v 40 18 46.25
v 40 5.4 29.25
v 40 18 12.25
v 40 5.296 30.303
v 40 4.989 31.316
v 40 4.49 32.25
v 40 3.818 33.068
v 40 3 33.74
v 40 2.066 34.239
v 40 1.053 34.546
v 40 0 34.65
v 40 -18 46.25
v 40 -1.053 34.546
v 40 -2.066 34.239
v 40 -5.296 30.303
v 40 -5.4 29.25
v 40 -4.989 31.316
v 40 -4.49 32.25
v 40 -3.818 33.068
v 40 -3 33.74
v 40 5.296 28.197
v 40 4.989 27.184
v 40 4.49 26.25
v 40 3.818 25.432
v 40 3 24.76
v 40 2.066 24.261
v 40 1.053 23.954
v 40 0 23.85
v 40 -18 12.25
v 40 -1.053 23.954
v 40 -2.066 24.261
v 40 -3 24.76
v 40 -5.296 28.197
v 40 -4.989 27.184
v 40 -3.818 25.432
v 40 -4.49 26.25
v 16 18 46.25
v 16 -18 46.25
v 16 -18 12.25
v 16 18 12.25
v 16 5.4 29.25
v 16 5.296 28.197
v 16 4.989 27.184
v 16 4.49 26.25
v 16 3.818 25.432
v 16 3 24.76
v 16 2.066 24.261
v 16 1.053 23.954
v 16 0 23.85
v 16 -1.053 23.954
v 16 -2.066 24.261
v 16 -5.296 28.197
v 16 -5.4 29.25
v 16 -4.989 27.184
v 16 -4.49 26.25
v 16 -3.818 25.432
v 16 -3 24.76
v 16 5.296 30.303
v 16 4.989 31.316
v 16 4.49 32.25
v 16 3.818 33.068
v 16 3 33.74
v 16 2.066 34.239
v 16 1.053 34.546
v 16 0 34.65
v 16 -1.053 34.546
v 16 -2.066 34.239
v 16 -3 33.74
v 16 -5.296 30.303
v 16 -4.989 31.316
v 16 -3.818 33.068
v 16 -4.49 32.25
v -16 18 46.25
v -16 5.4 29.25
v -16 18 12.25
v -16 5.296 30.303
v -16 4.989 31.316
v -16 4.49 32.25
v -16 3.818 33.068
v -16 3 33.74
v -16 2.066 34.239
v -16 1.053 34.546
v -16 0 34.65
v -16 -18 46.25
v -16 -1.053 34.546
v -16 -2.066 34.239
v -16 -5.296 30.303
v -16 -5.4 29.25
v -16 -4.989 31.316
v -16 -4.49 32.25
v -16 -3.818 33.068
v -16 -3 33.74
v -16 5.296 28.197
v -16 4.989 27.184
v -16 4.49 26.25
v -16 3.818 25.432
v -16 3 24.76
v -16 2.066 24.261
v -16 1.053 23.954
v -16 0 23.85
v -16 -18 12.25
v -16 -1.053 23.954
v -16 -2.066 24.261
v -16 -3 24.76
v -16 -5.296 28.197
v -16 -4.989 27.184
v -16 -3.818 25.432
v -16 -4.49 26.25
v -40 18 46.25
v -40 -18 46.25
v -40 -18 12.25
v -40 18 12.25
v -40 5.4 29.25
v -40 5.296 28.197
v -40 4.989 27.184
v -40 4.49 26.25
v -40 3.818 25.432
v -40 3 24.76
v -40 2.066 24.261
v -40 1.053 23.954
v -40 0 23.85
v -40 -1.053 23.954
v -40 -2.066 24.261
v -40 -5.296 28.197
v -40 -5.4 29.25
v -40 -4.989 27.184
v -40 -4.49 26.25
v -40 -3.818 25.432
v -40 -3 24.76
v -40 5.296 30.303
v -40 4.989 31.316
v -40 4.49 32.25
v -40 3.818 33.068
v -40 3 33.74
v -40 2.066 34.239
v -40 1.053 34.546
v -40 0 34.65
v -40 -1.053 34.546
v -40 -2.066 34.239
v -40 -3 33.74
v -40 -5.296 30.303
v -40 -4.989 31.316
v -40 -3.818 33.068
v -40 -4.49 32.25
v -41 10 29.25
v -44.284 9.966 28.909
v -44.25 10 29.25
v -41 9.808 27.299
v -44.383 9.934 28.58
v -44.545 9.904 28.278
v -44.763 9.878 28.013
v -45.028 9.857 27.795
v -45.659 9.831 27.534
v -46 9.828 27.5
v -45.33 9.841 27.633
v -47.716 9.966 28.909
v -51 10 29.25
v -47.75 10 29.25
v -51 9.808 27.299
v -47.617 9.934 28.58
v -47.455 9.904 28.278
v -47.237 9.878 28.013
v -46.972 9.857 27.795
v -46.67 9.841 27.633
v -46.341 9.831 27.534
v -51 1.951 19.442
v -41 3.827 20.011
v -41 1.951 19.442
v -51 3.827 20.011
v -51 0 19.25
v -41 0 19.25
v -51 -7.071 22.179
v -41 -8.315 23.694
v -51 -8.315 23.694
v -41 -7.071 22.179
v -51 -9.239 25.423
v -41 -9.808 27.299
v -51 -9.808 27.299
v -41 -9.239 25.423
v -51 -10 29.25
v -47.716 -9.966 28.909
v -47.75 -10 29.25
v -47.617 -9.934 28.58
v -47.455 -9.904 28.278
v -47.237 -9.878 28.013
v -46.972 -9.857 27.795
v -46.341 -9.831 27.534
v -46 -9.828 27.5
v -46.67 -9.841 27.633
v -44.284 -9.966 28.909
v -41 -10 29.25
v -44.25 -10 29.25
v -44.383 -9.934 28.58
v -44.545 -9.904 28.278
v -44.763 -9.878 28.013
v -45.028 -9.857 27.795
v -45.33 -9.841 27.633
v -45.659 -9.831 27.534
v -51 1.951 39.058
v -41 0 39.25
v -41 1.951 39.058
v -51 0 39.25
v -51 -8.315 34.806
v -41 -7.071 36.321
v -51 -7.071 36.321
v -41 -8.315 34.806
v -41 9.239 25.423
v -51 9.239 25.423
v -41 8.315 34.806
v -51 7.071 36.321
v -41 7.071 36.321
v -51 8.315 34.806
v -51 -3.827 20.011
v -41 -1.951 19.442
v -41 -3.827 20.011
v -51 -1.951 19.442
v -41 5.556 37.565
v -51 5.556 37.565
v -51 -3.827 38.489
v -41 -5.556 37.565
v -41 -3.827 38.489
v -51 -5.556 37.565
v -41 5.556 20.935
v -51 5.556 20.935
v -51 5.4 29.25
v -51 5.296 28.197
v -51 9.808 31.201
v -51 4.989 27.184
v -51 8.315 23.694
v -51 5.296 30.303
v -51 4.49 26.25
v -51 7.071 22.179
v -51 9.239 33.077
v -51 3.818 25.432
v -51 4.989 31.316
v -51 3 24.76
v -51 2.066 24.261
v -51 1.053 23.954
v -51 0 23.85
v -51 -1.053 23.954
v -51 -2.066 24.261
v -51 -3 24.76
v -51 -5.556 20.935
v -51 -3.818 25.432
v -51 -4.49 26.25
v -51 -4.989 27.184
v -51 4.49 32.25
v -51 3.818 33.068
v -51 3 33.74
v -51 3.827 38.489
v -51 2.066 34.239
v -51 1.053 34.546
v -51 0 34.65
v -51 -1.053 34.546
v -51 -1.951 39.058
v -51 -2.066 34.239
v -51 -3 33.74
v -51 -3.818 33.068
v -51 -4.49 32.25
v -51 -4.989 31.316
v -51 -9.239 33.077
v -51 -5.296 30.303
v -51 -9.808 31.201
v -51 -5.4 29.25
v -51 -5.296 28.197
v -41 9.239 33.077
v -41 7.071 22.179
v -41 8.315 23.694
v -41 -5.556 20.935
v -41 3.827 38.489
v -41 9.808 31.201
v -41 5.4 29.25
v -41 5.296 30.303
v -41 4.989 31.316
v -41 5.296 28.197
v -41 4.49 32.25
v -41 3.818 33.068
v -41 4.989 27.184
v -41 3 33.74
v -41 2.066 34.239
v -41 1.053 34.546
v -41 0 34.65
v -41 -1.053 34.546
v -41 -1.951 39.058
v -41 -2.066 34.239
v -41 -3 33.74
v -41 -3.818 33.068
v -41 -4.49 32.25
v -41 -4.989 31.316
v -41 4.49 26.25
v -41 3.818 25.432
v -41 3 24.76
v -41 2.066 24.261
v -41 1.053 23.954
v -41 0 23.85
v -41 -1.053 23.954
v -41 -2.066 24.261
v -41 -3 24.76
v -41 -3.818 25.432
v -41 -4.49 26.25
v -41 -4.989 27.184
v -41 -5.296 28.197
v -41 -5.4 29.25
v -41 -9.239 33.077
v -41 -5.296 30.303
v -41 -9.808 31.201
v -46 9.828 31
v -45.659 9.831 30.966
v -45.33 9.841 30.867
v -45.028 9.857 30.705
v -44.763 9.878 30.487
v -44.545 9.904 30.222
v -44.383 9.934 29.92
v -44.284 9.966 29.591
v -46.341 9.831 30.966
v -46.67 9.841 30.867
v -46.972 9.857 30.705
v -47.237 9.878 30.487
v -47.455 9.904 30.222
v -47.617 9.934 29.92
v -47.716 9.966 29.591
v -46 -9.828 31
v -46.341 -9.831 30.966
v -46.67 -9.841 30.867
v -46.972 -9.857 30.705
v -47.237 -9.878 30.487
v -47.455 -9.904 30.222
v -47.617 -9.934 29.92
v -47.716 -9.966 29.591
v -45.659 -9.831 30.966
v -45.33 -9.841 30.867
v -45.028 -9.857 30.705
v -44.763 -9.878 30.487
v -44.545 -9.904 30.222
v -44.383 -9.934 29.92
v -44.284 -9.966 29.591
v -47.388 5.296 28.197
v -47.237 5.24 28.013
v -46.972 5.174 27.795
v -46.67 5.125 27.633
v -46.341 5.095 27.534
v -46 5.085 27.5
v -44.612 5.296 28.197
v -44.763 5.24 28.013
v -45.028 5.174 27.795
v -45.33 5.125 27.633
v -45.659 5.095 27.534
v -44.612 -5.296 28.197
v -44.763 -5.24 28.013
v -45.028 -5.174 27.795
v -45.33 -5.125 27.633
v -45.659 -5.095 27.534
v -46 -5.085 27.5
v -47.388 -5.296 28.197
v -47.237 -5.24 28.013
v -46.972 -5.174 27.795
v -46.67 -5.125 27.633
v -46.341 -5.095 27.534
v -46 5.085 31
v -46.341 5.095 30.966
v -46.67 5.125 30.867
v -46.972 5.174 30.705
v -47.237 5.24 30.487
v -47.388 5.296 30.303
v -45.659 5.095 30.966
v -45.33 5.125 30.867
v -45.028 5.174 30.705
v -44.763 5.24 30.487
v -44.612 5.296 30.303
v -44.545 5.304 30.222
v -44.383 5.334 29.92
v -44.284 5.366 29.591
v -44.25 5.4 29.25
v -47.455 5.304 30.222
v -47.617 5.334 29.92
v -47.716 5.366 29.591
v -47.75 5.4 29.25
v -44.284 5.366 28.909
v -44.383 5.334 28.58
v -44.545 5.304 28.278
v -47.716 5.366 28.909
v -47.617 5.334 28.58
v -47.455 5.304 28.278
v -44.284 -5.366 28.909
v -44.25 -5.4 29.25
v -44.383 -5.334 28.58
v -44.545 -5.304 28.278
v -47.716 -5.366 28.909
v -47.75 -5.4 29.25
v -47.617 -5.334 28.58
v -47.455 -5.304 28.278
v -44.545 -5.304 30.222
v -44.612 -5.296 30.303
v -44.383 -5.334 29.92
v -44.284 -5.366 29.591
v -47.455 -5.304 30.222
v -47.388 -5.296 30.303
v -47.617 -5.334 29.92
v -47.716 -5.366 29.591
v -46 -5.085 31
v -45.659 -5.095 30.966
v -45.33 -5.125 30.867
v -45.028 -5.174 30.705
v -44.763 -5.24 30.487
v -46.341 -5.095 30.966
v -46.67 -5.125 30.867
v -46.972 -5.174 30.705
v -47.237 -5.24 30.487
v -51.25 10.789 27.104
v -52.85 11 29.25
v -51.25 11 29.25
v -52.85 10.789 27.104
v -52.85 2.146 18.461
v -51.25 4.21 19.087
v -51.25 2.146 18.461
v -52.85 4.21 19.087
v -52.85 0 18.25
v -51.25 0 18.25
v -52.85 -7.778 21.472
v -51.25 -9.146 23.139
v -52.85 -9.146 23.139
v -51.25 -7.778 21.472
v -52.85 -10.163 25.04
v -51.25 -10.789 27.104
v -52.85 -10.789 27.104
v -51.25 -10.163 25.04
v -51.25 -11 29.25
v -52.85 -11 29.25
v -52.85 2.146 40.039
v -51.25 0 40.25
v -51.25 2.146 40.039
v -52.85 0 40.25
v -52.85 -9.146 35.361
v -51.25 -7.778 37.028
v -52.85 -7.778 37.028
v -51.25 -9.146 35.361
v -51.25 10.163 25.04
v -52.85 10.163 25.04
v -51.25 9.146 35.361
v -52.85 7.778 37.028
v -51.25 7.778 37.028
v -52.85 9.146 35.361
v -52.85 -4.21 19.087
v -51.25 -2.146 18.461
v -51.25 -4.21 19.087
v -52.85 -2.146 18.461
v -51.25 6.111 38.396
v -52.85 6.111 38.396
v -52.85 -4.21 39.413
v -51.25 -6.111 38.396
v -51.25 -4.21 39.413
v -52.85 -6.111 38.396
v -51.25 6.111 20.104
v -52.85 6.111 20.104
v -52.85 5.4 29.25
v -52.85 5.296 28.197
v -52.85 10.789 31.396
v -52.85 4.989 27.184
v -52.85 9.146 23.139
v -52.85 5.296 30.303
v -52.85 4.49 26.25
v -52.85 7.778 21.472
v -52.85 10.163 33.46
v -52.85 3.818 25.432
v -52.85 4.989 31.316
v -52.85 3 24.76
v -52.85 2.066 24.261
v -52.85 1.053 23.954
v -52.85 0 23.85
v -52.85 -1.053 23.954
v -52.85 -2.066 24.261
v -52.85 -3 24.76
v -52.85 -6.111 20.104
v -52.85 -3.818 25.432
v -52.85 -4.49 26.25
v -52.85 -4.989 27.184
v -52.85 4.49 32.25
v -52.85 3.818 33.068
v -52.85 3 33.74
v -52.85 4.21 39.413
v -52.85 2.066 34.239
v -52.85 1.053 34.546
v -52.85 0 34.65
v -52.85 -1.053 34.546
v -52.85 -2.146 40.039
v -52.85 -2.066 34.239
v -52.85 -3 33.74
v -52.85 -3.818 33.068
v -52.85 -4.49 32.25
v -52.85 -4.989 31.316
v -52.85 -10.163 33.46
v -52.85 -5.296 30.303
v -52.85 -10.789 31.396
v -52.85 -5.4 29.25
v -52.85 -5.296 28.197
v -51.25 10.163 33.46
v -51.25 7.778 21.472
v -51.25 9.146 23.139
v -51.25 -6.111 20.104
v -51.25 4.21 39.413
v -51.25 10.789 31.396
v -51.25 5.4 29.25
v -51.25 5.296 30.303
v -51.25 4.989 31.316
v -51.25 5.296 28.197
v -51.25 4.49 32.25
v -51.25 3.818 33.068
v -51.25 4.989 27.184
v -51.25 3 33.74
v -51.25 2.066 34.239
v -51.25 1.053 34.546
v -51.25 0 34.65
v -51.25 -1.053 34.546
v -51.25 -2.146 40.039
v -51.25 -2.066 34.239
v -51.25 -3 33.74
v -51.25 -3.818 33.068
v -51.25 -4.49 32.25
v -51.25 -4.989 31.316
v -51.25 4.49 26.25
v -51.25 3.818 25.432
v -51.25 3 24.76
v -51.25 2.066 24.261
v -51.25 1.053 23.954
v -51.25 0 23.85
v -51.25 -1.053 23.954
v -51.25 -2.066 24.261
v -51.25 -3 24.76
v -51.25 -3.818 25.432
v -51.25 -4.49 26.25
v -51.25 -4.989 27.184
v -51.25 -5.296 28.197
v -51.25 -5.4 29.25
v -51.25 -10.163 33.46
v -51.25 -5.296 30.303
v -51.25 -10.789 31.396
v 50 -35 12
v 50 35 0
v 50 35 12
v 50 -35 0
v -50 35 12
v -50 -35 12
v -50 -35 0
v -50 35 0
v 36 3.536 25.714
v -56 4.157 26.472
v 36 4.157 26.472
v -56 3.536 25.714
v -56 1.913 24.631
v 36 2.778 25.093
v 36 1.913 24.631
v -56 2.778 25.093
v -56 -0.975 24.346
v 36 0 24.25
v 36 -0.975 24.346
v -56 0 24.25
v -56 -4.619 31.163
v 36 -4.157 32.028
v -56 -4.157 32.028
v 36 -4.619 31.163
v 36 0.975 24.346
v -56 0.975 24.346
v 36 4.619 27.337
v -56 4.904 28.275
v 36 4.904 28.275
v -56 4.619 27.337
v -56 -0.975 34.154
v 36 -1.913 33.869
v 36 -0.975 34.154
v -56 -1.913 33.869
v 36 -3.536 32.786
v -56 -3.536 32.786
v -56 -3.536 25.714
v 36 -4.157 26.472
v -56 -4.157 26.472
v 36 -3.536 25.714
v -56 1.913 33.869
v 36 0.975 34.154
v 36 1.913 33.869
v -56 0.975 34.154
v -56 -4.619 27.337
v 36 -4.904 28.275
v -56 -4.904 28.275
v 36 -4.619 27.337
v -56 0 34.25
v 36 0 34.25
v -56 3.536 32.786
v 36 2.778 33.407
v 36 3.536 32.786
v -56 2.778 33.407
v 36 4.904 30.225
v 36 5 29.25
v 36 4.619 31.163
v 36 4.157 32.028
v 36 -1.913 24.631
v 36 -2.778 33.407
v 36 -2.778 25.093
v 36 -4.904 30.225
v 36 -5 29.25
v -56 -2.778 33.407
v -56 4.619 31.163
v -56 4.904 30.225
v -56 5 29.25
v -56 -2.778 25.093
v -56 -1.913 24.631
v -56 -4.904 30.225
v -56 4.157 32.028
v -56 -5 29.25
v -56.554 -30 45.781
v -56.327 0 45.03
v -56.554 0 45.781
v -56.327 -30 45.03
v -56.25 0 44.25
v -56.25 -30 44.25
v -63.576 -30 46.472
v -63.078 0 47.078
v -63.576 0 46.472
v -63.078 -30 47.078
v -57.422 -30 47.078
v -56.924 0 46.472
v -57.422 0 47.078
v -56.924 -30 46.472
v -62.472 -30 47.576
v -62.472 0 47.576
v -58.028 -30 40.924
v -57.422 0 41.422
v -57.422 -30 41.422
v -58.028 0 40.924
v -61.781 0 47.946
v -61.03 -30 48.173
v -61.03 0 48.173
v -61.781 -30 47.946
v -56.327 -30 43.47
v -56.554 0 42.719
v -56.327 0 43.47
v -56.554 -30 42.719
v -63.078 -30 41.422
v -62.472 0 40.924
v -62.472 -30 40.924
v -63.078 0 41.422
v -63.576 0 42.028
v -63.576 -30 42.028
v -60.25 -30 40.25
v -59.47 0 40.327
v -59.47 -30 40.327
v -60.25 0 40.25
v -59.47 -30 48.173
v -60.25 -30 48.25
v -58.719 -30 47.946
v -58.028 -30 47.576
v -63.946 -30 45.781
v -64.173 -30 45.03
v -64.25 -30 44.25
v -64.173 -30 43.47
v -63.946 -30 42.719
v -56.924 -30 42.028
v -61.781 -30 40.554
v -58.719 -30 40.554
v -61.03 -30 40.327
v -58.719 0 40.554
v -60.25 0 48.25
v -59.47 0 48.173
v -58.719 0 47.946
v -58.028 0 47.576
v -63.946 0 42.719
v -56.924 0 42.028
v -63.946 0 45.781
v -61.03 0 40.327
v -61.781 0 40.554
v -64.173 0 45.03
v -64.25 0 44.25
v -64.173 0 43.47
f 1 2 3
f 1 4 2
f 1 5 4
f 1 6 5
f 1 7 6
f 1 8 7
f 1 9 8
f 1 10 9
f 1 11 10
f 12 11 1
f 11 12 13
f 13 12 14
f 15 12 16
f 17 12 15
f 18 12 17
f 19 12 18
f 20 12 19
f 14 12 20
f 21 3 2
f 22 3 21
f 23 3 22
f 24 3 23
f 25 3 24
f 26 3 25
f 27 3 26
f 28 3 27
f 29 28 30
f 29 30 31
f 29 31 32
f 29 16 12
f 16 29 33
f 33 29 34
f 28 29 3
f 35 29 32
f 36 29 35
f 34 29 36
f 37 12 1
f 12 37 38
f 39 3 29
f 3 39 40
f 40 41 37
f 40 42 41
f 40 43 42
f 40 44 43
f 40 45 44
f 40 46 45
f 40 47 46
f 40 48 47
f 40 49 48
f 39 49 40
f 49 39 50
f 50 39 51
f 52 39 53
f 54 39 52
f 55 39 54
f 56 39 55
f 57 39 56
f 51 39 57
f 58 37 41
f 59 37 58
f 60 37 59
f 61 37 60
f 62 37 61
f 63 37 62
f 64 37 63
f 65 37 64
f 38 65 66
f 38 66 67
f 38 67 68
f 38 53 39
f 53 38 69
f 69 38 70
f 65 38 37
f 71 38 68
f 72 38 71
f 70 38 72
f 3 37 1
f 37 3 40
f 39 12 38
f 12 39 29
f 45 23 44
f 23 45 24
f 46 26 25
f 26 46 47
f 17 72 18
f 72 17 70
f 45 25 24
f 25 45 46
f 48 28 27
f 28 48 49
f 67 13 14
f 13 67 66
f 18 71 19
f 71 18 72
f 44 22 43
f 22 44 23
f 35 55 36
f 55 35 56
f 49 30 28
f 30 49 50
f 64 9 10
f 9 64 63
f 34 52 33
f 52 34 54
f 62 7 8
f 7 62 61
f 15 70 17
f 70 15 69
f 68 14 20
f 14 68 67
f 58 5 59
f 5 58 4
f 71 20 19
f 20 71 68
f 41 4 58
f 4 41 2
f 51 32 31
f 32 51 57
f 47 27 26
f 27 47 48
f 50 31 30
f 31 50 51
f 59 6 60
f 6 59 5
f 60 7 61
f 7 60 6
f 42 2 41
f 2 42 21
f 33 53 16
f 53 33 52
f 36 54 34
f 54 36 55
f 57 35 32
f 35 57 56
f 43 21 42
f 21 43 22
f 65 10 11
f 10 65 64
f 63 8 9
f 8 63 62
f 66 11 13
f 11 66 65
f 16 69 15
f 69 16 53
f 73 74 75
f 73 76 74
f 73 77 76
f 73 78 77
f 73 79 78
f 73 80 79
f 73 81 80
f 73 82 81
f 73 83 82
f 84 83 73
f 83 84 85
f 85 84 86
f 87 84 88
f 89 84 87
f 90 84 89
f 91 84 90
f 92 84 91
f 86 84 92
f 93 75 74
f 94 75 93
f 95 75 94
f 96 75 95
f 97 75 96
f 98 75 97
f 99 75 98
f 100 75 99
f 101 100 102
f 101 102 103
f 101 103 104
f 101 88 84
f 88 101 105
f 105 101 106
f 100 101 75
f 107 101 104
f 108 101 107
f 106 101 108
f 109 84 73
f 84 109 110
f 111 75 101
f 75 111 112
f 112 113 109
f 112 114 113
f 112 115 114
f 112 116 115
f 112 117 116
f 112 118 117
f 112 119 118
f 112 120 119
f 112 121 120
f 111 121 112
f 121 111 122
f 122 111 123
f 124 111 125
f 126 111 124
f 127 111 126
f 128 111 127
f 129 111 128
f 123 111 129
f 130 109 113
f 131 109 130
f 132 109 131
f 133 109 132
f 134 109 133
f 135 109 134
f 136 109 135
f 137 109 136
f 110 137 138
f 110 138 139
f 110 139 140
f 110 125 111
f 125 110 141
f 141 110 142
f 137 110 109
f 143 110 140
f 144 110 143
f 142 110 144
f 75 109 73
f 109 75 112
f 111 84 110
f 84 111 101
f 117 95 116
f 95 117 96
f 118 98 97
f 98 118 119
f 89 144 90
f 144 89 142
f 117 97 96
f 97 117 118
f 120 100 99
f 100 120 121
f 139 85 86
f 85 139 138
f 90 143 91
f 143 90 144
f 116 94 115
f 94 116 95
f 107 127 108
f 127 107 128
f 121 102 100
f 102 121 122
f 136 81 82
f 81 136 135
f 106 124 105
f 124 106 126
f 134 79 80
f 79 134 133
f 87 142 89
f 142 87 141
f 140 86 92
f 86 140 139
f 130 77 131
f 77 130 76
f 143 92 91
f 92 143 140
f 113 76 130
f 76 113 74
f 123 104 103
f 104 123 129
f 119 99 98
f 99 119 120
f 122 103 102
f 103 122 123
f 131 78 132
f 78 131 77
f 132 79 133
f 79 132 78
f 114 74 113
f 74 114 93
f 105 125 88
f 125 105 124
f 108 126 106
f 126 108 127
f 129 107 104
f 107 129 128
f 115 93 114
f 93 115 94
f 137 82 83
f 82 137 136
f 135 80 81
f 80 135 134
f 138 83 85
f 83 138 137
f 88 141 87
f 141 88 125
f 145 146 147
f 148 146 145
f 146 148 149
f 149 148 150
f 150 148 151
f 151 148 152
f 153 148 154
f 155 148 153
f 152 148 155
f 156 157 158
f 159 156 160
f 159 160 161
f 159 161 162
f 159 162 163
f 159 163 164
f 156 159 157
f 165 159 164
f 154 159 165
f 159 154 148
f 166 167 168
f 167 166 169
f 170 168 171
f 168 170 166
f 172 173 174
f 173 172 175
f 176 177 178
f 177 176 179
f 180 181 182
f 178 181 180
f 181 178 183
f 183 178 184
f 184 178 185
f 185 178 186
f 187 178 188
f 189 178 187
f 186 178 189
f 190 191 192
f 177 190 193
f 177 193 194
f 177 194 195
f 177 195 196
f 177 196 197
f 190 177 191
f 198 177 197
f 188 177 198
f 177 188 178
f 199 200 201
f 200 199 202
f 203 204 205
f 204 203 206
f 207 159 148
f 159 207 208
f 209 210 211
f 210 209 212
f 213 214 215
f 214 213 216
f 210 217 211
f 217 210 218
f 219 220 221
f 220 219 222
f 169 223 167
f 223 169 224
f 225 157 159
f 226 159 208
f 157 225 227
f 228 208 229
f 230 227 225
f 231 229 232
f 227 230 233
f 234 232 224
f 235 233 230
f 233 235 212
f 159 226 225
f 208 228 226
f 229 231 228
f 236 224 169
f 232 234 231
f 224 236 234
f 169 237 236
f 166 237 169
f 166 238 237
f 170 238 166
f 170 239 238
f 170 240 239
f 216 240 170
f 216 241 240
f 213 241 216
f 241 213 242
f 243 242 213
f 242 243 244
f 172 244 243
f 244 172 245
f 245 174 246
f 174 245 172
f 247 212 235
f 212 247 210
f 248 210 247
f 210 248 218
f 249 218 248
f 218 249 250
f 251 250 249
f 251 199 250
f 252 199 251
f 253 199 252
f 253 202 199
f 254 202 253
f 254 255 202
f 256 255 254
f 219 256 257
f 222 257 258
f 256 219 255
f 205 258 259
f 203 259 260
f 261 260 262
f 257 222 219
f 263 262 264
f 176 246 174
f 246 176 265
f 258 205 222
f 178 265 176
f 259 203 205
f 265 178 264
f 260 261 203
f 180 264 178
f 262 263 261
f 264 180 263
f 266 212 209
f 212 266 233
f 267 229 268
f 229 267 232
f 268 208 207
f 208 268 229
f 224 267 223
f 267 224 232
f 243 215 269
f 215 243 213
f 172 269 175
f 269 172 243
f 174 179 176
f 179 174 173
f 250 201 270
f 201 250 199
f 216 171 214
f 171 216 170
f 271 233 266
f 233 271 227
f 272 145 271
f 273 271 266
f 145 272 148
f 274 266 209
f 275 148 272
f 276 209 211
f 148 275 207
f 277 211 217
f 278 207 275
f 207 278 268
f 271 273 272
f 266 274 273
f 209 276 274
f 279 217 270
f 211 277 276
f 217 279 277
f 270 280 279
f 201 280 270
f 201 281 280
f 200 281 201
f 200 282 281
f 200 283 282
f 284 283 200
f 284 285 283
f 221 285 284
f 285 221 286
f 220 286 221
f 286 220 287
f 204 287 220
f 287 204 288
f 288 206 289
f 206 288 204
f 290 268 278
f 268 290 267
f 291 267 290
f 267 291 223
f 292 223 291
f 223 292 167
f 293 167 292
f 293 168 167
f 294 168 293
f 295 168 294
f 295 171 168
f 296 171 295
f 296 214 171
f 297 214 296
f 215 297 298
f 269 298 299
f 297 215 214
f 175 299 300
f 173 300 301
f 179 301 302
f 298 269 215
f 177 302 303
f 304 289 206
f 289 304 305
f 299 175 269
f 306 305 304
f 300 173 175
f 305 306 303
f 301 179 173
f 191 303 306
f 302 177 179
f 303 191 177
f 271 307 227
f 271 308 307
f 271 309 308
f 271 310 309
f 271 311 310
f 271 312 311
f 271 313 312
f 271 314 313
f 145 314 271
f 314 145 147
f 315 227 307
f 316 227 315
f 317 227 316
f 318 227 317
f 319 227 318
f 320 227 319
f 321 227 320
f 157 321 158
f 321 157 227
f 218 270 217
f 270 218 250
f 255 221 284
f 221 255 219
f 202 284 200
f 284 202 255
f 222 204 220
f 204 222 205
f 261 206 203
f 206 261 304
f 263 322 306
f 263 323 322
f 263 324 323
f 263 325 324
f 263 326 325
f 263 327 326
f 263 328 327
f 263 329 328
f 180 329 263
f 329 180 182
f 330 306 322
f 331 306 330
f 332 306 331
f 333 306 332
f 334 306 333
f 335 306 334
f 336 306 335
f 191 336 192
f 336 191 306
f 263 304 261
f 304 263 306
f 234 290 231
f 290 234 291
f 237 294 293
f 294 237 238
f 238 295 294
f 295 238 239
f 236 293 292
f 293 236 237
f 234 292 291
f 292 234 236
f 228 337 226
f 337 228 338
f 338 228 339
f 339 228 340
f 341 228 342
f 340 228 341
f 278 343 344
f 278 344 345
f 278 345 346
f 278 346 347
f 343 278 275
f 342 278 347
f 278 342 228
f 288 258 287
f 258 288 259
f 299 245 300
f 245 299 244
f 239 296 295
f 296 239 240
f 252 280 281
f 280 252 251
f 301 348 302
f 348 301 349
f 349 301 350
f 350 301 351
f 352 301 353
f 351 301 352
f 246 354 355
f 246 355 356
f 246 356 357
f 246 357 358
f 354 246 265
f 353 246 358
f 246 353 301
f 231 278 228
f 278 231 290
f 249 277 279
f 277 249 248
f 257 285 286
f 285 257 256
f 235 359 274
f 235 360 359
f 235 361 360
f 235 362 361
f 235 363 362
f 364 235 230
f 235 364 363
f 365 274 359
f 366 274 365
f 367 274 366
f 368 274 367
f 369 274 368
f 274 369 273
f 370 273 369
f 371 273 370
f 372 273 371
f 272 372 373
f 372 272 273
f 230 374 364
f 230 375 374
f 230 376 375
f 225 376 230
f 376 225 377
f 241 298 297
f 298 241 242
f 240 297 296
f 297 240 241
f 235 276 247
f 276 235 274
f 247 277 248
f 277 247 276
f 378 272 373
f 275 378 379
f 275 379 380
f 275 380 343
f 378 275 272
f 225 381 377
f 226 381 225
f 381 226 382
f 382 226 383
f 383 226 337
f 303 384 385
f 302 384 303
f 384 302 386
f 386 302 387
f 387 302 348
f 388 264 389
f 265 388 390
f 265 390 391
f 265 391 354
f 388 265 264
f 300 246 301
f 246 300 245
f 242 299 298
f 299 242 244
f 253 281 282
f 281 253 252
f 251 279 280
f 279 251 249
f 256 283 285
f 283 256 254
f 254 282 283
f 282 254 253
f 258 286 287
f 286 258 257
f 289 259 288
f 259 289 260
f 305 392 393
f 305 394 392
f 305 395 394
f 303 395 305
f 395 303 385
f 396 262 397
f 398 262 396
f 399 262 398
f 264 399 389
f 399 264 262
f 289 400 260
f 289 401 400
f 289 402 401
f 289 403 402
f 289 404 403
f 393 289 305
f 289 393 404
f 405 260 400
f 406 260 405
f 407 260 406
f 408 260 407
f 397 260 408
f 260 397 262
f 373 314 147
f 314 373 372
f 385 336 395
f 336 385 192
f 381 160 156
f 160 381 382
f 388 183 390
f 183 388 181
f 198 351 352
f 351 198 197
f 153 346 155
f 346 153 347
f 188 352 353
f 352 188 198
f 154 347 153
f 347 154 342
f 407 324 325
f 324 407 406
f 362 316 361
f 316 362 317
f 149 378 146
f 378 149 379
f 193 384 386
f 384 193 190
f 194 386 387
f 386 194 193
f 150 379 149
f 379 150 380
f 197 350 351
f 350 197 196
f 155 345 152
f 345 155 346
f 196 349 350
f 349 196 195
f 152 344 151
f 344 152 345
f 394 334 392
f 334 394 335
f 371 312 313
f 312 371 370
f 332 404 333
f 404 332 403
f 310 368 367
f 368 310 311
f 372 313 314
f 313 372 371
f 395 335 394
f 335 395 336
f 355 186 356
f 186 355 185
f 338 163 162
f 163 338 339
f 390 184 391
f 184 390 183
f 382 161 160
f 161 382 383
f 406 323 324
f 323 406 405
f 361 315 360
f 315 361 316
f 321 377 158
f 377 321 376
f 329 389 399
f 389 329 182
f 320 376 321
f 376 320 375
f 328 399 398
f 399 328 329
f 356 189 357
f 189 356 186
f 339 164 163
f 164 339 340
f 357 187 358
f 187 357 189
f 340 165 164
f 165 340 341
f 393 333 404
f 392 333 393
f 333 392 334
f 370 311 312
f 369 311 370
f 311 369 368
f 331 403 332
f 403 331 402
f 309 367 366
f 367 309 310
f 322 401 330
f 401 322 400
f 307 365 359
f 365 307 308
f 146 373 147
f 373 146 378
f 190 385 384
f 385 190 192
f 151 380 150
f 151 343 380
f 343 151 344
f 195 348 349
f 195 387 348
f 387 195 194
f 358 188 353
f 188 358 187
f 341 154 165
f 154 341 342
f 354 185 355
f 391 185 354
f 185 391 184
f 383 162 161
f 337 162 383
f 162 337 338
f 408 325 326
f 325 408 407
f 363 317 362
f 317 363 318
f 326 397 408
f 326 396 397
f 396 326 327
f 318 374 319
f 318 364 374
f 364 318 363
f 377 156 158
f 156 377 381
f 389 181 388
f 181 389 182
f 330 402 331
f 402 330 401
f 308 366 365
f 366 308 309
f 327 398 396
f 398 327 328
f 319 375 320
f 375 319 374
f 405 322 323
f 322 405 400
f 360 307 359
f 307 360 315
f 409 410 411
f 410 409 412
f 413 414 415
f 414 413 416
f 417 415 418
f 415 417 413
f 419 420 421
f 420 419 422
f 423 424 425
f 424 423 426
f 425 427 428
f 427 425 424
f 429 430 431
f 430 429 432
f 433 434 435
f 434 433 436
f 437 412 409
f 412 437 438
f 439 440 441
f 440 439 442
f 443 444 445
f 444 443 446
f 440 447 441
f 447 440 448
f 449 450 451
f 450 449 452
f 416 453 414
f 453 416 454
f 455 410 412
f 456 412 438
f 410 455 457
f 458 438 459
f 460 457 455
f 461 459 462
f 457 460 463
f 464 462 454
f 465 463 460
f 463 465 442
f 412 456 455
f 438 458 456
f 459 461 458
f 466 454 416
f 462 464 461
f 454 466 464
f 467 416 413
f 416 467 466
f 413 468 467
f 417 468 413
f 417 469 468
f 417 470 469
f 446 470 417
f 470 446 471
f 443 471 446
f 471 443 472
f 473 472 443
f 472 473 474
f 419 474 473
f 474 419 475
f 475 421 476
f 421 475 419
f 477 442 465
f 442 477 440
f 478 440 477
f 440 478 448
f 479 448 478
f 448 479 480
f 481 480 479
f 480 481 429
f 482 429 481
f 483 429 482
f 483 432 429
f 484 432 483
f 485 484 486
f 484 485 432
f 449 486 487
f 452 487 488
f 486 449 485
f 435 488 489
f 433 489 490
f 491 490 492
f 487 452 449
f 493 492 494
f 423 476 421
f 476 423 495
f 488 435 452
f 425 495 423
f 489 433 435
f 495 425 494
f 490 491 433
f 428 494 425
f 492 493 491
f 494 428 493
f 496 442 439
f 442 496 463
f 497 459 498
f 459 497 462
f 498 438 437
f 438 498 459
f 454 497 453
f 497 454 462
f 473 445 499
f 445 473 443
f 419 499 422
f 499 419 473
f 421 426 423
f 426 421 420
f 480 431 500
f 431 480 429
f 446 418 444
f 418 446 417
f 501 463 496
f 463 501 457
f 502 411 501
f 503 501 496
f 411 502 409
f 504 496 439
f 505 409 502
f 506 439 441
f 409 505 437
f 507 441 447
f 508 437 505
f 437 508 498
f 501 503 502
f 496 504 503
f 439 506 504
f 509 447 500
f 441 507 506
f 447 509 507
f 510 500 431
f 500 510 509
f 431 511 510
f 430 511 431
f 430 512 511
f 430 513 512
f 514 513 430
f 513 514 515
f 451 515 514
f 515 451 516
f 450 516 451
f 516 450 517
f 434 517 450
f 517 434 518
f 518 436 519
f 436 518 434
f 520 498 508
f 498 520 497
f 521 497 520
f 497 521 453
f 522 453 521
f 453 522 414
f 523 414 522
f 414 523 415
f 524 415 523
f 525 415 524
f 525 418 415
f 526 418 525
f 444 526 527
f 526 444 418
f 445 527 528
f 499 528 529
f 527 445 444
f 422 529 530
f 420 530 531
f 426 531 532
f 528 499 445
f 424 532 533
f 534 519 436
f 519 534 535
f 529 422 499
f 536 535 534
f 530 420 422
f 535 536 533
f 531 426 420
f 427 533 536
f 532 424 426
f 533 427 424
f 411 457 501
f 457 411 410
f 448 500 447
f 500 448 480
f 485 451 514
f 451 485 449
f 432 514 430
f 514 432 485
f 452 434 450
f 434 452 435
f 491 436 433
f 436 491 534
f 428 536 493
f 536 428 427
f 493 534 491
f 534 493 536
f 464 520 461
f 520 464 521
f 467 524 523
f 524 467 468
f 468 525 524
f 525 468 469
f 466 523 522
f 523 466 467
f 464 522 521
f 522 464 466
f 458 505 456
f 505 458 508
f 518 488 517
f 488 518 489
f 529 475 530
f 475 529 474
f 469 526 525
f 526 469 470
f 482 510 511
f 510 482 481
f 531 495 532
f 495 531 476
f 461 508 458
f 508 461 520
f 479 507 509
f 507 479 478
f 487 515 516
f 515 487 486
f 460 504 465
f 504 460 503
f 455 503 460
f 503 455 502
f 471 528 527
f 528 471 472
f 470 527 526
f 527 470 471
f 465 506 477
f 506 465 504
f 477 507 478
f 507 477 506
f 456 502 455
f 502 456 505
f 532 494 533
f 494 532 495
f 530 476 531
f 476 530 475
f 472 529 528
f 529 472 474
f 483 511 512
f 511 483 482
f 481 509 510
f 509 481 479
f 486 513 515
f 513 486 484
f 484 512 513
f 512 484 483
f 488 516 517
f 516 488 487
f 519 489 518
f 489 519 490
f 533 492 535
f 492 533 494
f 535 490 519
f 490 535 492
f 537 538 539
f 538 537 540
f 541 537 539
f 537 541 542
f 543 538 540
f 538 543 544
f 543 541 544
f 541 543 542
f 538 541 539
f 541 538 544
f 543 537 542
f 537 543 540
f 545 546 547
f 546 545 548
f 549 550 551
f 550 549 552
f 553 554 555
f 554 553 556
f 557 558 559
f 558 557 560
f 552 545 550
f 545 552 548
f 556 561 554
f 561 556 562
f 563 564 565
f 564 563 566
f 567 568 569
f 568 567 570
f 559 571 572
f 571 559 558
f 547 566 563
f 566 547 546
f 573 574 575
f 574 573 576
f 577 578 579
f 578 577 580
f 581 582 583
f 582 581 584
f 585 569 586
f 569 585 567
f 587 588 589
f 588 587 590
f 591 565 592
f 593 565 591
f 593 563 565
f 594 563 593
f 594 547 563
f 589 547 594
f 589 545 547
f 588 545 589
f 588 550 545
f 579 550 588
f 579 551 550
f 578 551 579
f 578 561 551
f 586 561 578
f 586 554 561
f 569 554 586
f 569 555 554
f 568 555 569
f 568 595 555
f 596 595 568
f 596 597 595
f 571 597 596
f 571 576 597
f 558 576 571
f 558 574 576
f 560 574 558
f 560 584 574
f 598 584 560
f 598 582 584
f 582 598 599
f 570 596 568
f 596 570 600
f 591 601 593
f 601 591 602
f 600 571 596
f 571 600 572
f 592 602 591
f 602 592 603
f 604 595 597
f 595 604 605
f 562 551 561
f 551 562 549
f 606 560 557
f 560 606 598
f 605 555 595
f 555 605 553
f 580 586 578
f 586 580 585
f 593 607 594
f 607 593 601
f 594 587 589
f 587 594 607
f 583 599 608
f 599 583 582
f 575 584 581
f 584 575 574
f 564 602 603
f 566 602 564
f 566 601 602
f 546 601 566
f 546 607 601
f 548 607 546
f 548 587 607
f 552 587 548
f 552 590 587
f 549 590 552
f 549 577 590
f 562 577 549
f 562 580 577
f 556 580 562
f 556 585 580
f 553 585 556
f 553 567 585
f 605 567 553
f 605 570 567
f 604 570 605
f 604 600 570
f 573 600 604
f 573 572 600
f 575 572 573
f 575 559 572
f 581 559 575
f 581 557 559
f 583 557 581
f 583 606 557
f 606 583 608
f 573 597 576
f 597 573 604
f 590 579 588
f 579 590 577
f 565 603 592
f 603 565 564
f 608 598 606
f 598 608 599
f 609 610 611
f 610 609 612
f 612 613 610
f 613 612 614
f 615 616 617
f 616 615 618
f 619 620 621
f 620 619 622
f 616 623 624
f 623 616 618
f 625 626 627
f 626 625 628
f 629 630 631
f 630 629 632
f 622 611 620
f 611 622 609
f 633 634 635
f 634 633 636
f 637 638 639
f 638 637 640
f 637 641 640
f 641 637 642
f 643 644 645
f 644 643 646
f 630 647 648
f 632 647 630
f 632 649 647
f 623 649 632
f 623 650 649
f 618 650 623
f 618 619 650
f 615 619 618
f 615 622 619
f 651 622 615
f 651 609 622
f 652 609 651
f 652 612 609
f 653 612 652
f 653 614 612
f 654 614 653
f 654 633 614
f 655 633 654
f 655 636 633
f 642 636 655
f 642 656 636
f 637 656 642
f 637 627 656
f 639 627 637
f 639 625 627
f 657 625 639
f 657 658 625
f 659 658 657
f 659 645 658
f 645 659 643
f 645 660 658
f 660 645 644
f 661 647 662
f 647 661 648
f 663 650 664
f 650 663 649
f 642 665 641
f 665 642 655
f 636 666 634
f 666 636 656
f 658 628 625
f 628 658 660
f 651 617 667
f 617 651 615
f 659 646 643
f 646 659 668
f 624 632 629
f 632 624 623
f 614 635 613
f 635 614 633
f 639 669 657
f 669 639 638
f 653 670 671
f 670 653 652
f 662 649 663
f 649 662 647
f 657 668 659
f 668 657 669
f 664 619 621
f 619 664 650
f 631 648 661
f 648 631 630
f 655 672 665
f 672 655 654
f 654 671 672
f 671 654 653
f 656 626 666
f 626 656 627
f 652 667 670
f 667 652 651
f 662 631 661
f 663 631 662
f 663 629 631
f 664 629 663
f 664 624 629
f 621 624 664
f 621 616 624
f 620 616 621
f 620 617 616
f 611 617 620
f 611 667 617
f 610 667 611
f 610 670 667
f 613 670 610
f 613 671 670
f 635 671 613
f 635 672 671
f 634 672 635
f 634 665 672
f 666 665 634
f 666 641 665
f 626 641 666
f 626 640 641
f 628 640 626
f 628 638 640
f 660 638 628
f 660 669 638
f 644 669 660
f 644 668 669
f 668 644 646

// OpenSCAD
$fn = 32;

// ------------------------------------------------------------------------
// Machine vise: screw d10, jaws 24 x 34 mm
// Every part is its own module, assembly() places every instance.
// ------------------------------------------------------------------------

// --- part 1 ---
module vise_bed() {
  difference() {
    translate([-50, -35, 0]) cube([100, 70, 12]);
  }
}

// --- part 2 ---
module vise_jaw() {
  difference() {
    translate([-12, -18, 0]) cube([24, 36, 34]);
    translate([0, 0, 17]) rotate([0, 90, 0]) cylinder(h = 26, d = 10.8, center = true);
  }
}

// --- part 3 ---
module vise_screw() {
  translate([0, 0, -46]) cylinder(h = 92, d = 10);
}

// --- part 4 ---
module screw_collar() {
  difference() {
    cylinder(h = 10, d = 20);
    translate([0, 0, -1]) cylinder(h = 12, d = 10.8);
    translate([0, 0, 5]) rotate([90, 0, 0]) cylinder(h = 22, d = 3.5, center = true);
  }
}

// --- part 5 ---
module screw_washer() {
  difference() {
      translate([0, 0, 0]) cylinder(h = 1.6, d = 22);
      translate([0, 0, -1]) cylinder(h = 3.6, d = 10.8);
    }
}

// --- part 6 ---
module vise_handle() {
  cylinder(h = 30, d = 8);
}

// --- assembly ---
module assembly() {
  color([0.80, 0.24, 0.20]) translate([0, 0, 0]) rotate([0, 0, 0]) vise_bed();
  color([0.20, 0.45, 0.75]) translate([28, 0, 12.25]) rotate([0, 0, 0]) vise_jaw();
  color([0.25, 0.62, 0.32]) translate([-28, 0, 12.25]) rotate([0, 0, 0]) vise_jaw();
  color([0.92, 0.70, 0.18]) translate([-10, 0, 29.25]) rotate([0, 90, 0]) vise_screw();
  color([0.58, 0.35, 0.70]) translate([-51, 0, 29.25]) rotate([0, 90, 0]) screw_collar();
  color([0.16, 0.66, 0.66]) translate([-52.85, 0, 29.25]) rotate([0, 90, 0]) screw_washer();
  color([0.85, 0.48, 0.18]) translate([-60.25, 0, 44.25]) rotate([90, 0, 0]) vise_handle();
}

assembly();
